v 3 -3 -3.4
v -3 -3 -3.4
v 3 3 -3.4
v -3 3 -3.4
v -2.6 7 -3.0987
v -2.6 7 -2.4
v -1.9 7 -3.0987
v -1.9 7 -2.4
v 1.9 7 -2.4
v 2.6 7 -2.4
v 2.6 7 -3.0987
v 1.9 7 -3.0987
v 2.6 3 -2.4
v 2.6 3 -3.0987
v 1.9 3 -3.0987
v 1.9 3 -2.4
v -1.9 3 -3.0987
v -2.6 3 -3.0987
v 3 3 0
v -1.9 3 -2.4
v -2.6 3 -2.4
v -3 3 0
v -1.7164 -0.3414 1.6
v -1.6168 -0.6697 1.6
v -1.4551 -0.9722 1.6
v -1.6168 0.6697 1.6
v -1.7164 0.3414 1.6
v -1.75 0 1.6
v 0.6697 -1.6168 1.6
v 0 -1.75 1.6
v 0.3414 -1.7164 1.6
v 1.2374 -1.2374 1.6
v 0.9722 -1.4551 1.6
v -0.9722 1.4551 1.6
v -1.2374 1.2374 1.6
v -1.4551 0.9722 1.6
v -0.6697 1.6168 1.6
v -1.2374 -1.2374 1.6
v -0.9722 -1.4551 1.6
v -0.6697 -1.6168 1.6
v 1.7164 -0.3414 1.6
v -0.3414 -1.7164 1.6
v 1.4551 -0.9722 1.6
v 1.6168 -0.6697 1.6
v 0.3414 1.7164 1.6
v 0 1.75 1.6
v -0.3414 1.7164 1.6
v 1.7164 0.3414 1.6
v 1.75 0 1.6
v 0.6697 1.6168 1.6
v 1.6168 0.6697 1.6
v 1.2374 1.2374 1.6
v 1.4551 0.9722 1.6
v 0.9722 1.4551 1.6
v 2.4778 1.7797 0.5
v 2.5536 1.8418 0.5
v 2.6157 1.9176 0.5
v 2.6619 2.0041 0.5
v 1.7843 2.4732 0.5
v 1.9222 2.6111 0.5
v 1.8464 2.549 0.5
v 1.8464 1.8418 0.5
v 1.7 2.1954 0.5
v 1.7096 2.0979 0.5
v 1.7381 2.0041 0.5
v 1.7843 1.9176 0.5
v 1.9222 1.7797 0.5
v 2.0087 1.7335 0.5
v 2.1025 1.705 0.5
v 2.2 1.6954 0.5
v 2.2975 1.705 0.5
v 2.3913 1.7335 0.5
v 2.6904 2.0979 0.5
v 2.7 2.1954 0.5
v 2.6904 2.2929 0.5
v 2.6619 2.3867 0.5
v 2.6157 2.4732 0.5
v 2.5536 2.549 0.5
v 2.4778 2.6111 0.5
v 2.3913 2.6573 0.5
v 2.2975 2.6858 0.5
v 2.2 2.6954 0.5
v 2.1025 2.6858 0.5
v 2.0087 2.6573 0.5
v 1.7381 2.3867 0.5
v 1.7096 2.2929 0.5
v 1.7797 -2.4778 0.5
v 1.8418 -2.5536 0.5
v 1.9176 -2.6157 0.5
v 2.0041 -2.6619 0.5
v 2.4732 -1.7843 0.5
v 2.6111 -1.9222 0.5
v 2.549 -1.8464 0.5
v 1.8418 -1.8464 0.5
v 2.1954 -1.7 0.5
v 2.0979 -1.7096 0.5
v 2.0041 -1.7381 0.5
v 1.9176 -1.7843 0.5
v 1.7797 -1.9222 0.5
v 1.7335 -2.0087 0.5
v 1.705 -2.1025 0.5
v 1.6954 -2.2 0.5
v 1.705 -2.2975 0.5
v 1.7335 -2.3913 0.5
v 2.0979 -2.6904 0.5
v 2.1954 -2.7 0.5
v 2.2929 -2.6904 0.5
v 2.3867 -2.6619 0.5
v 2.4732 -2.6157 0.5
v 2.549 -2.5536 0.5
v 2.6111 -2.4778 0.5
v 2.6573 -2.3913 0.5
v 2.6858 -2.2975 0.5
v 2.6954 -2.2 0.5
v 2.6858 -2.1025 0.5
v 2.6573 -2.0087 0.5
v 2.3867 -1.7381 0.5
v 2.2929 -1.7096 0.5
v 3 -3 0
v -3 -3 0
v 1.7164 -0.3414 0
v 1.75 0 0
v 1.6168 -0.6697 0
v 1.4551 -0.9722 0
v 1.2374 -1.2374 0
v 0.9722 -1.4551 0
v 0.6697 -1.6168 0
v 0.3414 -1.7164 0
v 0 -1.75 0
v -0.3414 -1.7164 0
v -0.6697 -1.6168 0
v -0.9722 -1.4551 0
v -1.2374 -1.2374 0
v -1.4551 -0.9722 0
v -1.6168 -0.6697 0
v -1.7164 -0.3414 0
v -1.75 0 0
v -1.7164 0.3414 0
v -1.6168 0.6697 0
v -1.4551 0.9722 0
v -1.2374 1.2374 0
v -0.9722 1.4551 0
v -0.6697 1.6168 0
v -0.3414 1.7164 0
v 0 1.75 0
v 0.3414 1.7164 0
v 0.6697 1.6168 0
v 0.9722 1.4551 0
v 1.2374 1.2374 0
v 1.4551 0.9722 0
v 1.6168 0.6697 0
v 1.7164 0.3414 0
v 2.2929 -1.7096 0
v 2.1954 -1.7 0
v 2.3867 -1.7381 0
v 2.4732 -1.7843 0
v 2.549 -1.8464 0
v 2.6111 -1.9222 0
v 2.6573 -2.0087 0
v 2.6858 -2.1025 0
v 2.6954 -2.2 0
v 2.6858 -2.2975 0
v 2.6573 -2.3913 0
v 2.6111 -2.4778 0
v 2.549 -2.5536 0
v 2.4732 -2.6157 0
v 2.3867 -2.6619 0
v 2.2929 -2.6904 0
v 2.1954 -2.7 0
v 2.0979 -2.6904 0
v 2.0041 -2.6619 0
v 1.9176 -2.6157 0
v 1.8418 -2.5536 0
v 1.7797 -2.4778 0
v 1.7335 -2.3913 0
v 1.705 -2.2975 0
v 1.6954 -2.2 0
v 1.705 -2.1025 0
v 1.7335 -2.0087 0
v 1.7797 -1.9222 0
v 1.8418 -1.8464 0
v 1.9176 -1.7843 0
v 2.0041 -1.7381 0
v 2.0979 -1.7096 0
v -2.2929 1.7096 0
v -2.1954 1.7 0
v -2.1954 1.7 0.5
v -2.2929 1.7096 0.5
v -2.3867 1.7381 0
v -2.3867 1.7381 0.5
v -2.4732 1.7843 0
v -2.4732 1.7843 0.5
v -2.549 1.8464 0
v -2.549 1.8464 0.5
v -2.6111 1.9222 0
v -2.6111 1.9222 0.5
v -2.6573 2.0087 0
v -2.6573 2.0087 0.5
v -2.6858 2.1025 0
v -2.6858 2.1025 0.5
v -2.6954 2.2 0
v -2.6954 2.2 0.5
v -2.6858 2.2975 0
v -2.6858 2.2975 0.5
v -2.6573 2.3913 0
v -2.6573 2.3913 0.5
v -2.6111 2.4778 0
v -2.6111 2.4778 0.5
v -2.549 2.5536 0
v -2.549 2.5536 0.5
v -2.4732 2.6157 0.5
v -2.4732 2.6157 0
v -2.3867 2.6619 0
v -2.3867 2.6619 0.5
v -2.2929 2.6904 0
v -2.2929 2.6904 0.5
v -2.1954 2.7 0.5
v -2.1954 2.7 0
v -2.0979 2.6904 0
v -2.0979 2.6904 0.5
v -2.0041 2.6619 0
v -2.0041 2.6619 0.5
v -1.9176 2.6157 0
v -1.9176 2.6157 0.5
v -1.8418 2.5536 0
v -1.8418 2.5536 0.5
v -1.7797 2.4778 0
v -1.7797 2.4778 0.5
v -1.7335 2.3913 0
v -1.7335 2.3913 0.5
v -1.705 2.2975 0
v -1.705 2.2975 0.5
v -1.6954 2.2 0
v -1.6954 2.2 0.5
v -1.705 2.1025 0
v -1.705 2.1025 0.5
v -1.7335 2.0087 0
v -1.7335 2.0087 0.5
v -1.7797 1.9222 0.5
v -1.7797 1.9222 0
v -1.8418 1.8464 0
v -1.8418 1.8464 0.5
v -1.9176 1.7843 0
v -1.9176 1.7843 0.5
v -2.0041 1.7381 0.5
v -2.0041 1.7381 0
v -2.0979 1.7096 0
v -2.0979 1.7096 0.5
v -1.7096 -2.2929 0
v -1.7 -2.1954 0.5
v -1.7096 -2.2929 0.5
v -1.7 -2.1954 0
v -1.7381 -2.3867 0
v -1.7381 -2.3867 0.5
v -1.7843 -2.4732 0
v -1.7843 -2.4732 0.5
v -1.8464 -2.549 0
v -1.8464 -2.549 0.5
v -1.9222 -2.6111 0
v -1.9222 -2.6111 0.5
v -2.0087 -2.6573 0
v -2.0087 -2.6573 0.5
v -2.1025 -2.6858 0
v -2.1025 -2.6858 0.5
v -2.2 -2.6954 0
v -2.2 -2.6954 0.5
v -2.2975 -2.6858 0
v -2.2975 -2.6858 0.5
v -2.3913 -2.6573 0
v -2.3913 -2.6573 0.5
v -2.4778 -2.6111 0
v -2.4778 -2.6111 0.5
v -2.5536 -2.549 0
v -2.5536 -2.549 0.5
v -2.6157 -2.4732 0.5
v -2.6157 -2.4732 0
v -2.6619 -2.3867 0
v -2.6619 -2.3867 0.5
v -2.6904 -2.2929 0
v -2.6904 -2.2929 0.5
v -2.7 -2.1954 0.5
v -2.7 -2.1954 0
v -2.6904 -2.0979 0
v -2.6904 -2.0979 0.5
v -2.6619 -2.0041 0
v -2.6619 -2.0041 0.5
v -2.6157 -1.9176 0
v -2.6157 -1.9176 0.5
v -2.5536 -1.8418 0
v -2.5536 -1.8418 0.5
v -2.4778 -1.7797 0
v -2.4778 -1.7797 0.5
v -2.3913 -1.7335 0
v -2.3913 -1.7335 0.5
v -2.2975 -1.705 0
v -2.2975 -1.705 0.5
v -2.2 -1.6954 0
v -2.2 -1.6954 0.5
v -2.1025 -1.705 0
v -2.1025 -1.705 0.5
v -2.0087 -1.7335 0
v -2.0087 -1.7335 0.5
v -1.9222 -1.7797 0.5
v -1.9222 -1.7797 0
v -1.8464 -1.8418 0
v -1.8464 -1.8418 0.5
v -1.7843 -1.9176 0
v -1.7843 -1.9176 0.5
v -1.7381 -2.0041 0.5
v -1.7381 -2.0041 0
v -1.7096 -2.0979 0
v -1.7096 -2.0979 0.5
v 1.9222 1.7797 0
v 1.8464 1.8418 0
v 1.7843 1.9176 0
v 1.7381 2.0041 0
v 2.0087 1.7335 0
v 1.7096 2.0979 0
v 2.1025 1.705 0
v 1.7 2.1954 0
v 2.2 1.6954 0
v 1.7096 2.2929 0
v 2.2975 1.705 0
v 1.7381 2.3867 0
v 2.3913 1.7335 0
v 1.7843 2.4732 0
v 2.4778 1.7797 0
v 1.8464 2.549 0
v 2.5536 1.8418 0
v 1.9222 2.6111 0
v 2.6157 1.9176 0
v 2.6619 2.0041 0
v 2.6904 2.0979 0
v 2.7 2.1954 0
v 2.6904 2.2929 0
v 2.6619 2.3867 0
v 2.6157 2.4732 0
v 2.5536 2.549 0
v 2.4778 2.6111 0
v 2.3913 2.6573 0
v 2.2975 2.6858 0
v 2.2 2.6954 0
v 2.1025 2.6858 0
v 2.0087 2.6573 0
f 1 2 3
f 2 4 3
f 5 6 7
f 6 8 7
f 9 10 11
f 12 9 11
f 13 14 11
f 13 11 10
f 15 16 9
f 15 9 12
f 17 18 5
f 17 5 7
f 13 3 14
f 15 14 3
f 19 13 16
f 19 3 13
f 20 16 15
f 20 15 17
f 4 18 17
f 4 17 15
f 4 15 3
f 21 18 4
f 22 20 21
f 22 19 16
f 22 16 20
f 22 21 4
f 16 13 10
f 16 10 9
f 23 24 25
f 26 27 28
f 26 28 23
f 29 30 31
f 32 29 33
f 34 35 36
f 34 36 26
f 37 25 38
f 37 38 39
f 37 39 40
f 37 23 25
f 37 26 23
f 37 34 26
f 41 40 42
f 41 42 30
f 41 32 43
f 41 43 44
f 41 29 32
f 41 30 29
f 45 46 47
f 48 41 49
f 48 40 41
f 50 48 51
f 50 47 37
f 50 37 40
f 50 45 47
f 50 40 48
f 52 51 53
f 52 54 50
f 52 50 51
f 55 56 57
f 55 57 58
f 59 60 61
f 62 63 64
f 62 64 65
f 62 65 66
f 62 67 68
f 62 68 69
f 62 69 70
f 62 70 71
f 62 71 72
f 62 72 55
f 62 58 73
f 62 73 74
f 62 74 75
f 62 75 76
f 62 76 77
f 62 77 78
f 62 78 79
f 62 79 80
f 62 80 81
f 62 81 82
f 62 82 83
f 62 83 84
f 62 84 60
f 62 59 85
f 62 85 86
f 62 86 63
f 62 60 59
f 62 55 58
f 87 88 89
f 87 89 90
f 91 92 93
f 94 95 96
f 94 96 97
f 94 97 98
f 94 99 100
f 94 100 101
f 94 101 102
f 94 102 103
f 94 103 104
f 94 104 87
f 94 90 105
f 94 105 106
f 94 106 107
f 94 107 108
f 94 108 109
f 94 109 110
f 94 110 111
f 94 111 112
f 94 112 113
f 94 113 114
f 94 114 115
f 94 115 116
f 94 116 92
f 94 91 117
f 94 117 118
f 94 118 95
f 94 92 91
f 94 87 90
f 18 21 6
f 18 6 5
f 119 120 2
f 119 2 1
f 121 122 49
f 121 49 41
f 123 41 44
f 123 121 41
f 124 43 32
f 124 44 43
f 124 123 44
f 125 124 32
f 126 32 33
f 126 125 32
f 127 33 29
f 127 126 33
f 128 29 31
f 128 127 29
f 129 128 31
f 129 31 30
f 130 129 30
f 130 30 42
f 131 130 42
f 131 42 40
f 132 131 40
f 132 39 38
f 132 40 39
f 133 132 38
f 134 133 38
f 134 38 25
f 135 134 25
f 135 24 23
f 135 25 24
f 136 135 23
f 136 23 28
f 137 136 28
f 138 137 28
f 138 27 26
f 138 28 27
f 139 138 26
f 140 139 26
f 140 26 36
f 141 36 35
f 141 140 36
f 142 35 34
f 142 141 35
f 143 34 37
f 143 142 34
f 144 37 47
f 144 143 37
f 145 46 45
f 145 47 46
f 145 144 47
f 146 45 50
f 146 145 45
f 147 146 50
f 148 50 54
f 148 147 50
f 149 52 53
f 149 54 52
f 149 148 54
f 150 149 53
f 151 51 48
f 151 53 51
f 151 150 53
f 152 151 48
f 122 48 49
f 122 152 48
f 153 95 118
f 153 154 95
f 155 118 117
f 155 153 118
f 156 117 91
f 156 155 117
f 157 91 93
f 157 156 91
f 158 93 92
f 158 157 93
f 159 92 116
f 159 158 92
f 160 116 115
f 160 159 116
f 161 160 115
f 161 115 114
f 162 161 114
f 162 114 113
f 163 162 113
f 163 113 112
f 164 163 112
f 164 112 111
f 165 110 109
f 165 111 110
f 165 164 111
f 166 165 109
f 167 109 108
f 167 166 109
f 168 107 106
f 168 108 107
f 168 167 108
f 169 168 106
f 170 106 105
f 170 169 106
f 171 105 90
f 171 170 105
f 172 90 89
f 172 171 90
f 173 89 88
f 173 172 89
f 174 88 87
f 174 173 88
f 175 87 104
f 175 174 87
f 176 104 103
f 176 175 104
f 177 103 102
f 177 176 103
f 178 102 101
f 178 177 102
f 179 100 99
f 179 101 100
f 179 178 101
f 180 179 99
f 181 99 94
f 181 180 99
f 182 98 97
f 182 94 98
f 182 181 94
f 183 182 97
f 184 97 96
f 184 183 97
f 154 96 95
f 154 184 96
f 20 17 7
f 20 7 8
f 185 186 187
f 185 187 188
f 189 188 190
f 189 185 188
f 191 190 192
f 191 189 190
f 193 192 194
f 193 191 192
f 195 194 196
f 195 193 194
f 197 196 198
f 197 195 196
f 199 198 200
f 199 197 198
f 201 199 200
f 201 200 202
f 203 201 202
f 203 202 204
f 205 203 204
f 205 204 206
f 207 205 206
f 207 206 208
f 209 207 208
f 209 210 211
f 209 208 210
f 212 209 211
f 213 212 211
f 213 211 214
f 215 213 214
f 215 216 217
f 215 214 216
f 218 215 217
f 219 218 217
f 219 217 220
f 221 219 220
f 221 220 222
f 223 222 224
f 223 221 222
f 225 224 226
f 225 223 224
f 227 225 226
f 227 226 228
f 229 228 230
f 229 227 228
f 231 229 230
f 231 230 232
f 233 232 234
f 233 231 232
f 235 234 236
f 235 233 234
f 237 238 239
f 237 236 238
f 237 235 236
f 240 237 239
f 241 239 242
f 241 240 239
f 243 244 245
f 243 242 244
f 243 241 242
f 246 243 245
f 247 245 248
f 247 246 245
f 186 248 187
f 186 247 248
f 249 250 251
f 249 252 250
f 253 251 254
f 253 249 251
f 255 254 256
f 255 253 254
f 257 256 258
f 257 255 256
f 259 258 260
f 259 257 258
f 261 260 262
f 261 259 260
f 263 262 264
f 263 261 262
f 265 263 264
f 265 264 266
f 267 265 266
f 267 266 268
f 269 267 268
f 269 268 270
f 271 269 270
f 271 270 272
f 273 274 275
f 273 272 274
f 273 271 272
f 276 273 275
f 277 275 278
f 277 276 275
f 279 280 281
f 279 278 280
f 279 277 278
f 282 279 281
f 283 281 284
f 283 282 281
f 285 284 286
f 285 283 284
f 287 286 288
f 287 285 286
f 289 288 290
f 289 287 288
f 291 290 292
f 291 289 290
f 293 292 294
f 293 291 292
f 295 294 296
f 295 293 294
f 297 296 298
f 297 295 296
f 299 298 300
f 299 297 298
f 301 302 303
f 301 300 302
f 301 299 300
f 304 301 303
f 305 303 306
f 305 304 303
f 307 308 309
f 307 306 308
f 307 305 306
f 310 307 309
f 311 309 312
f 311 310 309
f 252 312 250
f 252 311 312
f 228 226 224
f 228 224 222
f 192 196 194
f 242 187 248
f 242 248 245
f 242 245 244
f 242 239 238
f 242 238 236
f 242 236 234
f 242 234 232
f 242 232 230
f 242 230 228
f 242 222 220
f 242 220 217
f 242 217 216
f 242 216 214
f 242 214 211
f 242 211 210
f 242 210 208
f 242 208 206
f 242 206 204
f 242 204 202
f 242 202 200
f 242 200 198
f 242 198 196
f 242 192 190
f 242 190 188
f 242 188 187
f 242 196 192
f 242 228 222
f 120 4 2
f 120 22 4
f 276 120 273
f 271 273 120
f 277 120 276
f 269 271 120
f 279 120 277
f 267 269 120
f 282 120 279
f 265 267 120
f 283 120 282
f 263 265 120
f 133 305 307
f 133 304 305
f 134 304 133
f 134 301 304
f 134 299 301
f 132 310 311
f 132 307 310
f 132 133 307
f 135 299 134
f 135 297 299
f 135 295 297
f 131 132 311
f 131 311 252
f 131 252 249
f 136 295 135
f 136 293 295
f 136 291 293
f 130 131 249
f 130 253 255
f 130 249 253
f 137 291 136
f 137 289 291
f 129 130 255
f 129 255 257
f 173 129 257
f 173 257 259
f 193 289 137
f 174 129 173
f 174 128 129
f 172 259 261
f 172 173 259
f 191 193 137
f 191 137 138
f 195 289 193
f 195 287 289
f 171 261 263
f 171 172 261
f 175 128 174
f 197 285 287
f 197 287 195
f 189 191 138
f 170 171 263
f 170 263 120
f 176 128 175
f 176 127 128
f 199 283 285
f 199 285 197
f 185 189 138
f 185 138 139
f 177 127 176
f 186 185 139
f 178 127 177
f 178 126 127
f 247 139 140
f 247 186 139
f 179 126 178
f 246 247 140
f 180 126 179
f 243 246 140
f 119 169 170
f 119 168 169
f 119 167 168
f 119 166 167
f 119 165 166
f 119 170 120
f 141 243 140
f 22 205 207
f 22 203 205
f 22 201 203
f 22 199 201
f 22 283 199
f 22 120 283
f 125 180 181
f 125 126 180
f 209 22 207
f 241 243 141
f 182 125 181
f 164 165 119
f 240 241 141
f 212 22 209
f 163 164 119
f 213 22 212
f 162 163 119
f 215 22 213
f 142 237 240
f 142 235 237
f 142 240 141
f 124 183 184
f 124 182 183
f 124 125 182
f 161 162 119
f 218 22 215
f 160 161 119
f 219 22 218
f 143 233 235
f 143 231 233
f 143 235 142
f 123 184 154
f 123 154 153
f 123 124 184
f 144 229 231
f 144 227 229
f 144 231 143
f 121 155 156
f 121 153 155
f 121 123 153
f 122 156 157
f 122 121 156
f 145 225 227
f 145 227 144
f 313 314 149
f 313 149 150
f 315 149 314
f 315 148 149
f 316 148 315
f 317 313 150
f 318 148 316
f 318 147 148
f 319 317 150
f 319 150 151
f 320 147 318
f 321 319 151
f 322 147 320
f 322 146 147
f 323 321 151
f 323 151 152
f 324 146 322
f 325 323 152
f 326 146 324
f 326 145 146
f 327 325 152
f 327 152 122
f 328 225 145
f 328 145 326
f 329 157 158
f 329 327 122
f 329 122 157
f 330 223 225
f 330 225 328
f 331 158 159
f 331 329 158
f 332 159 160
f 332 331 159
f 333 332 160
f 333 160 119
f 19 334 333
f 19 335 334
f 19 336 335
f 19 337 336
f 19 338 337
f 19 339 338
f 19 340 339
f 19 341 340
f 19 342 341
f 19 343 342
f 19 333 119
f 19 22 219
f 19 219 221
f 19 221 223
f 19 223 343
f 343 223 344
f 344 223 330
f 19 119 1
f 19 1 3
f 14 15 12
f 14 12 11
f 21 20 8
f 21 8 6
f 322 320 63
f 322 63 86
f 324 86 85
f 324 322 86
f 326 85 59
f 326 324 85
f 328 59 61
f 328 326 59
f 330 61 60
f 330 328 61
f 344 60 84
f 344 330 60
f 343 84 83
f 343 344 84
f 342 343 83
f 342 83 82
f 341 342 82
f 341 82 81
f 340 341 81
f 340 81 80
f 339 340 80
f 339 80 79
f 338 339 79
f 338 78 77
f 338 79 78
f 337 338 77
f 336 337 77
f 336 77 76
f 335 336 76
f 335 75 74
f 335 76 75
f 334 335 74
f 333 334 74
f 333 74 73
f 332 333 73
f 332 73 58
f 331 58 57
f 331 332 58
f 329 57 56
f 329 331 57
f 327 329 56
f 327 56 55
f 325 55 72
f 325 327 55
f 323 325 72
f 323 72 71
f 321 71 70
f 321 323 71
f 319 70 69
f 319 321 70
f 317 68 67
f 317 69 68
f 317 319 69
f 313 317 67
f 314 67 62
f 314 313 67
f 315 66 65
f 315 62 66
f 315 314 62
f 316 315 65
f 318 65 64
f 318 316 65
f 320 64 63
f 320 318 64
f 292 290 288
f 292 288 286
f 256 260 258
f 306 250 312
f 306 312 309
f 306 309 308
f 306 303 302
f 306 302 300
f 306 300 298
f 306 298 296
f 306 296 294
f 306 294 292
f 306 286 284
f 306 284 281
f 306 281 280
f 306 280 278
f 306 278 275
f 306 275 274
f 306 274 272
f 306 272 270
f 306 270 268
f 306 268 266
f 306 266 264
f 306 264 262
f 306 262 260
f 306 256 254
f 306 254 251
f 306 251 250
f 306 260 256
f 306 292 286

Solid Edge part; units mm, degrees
sketch "Sketch1" plane through (0, 0, 0) normal (0, 0, 1) x (1, 0, 0)
  line L0 (-3, -3) -> (3, -3)
  line L1 (3, -3) -> (3, 3)
  line L2 (3, 3) -> (-3, 3)
  line L3 (-3, 3) -> (-3, -3)
extrude "Protrusion1" add sketch "Sketch1" against normal blind 3.4
sketch "Sketch2" plane through (0, 0, 0) normal (0, 0, 1) x (1, 0, 0)
  circle A0 centre (0, 0) radius 1.75
extrude "ExtrudedProtrusion_2" add sketch "Sketch2" along normal blind 1.6
sketch "Sketch3" plane through (0, 0, 0) normal (0, 0, 1) x (1, 0, 0)
  circle A0 centre (-2.2, -2.1954) radius 0.5
extrude "ExtrudedProtrusion_3" add sketch "Sketch3" along normal blind 0.5
pattern_circular "Pattern1" count 4 over 360 about axis through (0, 0, 0) along (0, 0, -1) of "ExtrudedProtrusion_3"
extrude "ExtrudedProtrusion_4" [suppressed]
sketch "Sketch4" plane through (0, 3, -1.7) normal (0, 1, 0) x (0, 0, -1)
  line L0 (0.7, -1.9) -> (1.3987, -1.9)
  line L1 (1.3987, -1.9) -> (1.3987, -2.6)
  line L2 (1.3987, -2.6) -> (0.7, -2.6)
  line L3 (0.7, -2.6) -> (0.7, -1.9)
  line L4 (0.7, 2.6) -> (1.3987, 2.6)
  line L5 (1.3987, 2.6) -> (1.3987, 1.9)
  line L6 (1.3987, 1.9) -> (0.7, 1.9)
  line L7 (0.7, 1.9) -> (0.7, 2.6)
extrude "ExtrudedProtrusion_5" add sketch "Sketch4" along normal blind 4
